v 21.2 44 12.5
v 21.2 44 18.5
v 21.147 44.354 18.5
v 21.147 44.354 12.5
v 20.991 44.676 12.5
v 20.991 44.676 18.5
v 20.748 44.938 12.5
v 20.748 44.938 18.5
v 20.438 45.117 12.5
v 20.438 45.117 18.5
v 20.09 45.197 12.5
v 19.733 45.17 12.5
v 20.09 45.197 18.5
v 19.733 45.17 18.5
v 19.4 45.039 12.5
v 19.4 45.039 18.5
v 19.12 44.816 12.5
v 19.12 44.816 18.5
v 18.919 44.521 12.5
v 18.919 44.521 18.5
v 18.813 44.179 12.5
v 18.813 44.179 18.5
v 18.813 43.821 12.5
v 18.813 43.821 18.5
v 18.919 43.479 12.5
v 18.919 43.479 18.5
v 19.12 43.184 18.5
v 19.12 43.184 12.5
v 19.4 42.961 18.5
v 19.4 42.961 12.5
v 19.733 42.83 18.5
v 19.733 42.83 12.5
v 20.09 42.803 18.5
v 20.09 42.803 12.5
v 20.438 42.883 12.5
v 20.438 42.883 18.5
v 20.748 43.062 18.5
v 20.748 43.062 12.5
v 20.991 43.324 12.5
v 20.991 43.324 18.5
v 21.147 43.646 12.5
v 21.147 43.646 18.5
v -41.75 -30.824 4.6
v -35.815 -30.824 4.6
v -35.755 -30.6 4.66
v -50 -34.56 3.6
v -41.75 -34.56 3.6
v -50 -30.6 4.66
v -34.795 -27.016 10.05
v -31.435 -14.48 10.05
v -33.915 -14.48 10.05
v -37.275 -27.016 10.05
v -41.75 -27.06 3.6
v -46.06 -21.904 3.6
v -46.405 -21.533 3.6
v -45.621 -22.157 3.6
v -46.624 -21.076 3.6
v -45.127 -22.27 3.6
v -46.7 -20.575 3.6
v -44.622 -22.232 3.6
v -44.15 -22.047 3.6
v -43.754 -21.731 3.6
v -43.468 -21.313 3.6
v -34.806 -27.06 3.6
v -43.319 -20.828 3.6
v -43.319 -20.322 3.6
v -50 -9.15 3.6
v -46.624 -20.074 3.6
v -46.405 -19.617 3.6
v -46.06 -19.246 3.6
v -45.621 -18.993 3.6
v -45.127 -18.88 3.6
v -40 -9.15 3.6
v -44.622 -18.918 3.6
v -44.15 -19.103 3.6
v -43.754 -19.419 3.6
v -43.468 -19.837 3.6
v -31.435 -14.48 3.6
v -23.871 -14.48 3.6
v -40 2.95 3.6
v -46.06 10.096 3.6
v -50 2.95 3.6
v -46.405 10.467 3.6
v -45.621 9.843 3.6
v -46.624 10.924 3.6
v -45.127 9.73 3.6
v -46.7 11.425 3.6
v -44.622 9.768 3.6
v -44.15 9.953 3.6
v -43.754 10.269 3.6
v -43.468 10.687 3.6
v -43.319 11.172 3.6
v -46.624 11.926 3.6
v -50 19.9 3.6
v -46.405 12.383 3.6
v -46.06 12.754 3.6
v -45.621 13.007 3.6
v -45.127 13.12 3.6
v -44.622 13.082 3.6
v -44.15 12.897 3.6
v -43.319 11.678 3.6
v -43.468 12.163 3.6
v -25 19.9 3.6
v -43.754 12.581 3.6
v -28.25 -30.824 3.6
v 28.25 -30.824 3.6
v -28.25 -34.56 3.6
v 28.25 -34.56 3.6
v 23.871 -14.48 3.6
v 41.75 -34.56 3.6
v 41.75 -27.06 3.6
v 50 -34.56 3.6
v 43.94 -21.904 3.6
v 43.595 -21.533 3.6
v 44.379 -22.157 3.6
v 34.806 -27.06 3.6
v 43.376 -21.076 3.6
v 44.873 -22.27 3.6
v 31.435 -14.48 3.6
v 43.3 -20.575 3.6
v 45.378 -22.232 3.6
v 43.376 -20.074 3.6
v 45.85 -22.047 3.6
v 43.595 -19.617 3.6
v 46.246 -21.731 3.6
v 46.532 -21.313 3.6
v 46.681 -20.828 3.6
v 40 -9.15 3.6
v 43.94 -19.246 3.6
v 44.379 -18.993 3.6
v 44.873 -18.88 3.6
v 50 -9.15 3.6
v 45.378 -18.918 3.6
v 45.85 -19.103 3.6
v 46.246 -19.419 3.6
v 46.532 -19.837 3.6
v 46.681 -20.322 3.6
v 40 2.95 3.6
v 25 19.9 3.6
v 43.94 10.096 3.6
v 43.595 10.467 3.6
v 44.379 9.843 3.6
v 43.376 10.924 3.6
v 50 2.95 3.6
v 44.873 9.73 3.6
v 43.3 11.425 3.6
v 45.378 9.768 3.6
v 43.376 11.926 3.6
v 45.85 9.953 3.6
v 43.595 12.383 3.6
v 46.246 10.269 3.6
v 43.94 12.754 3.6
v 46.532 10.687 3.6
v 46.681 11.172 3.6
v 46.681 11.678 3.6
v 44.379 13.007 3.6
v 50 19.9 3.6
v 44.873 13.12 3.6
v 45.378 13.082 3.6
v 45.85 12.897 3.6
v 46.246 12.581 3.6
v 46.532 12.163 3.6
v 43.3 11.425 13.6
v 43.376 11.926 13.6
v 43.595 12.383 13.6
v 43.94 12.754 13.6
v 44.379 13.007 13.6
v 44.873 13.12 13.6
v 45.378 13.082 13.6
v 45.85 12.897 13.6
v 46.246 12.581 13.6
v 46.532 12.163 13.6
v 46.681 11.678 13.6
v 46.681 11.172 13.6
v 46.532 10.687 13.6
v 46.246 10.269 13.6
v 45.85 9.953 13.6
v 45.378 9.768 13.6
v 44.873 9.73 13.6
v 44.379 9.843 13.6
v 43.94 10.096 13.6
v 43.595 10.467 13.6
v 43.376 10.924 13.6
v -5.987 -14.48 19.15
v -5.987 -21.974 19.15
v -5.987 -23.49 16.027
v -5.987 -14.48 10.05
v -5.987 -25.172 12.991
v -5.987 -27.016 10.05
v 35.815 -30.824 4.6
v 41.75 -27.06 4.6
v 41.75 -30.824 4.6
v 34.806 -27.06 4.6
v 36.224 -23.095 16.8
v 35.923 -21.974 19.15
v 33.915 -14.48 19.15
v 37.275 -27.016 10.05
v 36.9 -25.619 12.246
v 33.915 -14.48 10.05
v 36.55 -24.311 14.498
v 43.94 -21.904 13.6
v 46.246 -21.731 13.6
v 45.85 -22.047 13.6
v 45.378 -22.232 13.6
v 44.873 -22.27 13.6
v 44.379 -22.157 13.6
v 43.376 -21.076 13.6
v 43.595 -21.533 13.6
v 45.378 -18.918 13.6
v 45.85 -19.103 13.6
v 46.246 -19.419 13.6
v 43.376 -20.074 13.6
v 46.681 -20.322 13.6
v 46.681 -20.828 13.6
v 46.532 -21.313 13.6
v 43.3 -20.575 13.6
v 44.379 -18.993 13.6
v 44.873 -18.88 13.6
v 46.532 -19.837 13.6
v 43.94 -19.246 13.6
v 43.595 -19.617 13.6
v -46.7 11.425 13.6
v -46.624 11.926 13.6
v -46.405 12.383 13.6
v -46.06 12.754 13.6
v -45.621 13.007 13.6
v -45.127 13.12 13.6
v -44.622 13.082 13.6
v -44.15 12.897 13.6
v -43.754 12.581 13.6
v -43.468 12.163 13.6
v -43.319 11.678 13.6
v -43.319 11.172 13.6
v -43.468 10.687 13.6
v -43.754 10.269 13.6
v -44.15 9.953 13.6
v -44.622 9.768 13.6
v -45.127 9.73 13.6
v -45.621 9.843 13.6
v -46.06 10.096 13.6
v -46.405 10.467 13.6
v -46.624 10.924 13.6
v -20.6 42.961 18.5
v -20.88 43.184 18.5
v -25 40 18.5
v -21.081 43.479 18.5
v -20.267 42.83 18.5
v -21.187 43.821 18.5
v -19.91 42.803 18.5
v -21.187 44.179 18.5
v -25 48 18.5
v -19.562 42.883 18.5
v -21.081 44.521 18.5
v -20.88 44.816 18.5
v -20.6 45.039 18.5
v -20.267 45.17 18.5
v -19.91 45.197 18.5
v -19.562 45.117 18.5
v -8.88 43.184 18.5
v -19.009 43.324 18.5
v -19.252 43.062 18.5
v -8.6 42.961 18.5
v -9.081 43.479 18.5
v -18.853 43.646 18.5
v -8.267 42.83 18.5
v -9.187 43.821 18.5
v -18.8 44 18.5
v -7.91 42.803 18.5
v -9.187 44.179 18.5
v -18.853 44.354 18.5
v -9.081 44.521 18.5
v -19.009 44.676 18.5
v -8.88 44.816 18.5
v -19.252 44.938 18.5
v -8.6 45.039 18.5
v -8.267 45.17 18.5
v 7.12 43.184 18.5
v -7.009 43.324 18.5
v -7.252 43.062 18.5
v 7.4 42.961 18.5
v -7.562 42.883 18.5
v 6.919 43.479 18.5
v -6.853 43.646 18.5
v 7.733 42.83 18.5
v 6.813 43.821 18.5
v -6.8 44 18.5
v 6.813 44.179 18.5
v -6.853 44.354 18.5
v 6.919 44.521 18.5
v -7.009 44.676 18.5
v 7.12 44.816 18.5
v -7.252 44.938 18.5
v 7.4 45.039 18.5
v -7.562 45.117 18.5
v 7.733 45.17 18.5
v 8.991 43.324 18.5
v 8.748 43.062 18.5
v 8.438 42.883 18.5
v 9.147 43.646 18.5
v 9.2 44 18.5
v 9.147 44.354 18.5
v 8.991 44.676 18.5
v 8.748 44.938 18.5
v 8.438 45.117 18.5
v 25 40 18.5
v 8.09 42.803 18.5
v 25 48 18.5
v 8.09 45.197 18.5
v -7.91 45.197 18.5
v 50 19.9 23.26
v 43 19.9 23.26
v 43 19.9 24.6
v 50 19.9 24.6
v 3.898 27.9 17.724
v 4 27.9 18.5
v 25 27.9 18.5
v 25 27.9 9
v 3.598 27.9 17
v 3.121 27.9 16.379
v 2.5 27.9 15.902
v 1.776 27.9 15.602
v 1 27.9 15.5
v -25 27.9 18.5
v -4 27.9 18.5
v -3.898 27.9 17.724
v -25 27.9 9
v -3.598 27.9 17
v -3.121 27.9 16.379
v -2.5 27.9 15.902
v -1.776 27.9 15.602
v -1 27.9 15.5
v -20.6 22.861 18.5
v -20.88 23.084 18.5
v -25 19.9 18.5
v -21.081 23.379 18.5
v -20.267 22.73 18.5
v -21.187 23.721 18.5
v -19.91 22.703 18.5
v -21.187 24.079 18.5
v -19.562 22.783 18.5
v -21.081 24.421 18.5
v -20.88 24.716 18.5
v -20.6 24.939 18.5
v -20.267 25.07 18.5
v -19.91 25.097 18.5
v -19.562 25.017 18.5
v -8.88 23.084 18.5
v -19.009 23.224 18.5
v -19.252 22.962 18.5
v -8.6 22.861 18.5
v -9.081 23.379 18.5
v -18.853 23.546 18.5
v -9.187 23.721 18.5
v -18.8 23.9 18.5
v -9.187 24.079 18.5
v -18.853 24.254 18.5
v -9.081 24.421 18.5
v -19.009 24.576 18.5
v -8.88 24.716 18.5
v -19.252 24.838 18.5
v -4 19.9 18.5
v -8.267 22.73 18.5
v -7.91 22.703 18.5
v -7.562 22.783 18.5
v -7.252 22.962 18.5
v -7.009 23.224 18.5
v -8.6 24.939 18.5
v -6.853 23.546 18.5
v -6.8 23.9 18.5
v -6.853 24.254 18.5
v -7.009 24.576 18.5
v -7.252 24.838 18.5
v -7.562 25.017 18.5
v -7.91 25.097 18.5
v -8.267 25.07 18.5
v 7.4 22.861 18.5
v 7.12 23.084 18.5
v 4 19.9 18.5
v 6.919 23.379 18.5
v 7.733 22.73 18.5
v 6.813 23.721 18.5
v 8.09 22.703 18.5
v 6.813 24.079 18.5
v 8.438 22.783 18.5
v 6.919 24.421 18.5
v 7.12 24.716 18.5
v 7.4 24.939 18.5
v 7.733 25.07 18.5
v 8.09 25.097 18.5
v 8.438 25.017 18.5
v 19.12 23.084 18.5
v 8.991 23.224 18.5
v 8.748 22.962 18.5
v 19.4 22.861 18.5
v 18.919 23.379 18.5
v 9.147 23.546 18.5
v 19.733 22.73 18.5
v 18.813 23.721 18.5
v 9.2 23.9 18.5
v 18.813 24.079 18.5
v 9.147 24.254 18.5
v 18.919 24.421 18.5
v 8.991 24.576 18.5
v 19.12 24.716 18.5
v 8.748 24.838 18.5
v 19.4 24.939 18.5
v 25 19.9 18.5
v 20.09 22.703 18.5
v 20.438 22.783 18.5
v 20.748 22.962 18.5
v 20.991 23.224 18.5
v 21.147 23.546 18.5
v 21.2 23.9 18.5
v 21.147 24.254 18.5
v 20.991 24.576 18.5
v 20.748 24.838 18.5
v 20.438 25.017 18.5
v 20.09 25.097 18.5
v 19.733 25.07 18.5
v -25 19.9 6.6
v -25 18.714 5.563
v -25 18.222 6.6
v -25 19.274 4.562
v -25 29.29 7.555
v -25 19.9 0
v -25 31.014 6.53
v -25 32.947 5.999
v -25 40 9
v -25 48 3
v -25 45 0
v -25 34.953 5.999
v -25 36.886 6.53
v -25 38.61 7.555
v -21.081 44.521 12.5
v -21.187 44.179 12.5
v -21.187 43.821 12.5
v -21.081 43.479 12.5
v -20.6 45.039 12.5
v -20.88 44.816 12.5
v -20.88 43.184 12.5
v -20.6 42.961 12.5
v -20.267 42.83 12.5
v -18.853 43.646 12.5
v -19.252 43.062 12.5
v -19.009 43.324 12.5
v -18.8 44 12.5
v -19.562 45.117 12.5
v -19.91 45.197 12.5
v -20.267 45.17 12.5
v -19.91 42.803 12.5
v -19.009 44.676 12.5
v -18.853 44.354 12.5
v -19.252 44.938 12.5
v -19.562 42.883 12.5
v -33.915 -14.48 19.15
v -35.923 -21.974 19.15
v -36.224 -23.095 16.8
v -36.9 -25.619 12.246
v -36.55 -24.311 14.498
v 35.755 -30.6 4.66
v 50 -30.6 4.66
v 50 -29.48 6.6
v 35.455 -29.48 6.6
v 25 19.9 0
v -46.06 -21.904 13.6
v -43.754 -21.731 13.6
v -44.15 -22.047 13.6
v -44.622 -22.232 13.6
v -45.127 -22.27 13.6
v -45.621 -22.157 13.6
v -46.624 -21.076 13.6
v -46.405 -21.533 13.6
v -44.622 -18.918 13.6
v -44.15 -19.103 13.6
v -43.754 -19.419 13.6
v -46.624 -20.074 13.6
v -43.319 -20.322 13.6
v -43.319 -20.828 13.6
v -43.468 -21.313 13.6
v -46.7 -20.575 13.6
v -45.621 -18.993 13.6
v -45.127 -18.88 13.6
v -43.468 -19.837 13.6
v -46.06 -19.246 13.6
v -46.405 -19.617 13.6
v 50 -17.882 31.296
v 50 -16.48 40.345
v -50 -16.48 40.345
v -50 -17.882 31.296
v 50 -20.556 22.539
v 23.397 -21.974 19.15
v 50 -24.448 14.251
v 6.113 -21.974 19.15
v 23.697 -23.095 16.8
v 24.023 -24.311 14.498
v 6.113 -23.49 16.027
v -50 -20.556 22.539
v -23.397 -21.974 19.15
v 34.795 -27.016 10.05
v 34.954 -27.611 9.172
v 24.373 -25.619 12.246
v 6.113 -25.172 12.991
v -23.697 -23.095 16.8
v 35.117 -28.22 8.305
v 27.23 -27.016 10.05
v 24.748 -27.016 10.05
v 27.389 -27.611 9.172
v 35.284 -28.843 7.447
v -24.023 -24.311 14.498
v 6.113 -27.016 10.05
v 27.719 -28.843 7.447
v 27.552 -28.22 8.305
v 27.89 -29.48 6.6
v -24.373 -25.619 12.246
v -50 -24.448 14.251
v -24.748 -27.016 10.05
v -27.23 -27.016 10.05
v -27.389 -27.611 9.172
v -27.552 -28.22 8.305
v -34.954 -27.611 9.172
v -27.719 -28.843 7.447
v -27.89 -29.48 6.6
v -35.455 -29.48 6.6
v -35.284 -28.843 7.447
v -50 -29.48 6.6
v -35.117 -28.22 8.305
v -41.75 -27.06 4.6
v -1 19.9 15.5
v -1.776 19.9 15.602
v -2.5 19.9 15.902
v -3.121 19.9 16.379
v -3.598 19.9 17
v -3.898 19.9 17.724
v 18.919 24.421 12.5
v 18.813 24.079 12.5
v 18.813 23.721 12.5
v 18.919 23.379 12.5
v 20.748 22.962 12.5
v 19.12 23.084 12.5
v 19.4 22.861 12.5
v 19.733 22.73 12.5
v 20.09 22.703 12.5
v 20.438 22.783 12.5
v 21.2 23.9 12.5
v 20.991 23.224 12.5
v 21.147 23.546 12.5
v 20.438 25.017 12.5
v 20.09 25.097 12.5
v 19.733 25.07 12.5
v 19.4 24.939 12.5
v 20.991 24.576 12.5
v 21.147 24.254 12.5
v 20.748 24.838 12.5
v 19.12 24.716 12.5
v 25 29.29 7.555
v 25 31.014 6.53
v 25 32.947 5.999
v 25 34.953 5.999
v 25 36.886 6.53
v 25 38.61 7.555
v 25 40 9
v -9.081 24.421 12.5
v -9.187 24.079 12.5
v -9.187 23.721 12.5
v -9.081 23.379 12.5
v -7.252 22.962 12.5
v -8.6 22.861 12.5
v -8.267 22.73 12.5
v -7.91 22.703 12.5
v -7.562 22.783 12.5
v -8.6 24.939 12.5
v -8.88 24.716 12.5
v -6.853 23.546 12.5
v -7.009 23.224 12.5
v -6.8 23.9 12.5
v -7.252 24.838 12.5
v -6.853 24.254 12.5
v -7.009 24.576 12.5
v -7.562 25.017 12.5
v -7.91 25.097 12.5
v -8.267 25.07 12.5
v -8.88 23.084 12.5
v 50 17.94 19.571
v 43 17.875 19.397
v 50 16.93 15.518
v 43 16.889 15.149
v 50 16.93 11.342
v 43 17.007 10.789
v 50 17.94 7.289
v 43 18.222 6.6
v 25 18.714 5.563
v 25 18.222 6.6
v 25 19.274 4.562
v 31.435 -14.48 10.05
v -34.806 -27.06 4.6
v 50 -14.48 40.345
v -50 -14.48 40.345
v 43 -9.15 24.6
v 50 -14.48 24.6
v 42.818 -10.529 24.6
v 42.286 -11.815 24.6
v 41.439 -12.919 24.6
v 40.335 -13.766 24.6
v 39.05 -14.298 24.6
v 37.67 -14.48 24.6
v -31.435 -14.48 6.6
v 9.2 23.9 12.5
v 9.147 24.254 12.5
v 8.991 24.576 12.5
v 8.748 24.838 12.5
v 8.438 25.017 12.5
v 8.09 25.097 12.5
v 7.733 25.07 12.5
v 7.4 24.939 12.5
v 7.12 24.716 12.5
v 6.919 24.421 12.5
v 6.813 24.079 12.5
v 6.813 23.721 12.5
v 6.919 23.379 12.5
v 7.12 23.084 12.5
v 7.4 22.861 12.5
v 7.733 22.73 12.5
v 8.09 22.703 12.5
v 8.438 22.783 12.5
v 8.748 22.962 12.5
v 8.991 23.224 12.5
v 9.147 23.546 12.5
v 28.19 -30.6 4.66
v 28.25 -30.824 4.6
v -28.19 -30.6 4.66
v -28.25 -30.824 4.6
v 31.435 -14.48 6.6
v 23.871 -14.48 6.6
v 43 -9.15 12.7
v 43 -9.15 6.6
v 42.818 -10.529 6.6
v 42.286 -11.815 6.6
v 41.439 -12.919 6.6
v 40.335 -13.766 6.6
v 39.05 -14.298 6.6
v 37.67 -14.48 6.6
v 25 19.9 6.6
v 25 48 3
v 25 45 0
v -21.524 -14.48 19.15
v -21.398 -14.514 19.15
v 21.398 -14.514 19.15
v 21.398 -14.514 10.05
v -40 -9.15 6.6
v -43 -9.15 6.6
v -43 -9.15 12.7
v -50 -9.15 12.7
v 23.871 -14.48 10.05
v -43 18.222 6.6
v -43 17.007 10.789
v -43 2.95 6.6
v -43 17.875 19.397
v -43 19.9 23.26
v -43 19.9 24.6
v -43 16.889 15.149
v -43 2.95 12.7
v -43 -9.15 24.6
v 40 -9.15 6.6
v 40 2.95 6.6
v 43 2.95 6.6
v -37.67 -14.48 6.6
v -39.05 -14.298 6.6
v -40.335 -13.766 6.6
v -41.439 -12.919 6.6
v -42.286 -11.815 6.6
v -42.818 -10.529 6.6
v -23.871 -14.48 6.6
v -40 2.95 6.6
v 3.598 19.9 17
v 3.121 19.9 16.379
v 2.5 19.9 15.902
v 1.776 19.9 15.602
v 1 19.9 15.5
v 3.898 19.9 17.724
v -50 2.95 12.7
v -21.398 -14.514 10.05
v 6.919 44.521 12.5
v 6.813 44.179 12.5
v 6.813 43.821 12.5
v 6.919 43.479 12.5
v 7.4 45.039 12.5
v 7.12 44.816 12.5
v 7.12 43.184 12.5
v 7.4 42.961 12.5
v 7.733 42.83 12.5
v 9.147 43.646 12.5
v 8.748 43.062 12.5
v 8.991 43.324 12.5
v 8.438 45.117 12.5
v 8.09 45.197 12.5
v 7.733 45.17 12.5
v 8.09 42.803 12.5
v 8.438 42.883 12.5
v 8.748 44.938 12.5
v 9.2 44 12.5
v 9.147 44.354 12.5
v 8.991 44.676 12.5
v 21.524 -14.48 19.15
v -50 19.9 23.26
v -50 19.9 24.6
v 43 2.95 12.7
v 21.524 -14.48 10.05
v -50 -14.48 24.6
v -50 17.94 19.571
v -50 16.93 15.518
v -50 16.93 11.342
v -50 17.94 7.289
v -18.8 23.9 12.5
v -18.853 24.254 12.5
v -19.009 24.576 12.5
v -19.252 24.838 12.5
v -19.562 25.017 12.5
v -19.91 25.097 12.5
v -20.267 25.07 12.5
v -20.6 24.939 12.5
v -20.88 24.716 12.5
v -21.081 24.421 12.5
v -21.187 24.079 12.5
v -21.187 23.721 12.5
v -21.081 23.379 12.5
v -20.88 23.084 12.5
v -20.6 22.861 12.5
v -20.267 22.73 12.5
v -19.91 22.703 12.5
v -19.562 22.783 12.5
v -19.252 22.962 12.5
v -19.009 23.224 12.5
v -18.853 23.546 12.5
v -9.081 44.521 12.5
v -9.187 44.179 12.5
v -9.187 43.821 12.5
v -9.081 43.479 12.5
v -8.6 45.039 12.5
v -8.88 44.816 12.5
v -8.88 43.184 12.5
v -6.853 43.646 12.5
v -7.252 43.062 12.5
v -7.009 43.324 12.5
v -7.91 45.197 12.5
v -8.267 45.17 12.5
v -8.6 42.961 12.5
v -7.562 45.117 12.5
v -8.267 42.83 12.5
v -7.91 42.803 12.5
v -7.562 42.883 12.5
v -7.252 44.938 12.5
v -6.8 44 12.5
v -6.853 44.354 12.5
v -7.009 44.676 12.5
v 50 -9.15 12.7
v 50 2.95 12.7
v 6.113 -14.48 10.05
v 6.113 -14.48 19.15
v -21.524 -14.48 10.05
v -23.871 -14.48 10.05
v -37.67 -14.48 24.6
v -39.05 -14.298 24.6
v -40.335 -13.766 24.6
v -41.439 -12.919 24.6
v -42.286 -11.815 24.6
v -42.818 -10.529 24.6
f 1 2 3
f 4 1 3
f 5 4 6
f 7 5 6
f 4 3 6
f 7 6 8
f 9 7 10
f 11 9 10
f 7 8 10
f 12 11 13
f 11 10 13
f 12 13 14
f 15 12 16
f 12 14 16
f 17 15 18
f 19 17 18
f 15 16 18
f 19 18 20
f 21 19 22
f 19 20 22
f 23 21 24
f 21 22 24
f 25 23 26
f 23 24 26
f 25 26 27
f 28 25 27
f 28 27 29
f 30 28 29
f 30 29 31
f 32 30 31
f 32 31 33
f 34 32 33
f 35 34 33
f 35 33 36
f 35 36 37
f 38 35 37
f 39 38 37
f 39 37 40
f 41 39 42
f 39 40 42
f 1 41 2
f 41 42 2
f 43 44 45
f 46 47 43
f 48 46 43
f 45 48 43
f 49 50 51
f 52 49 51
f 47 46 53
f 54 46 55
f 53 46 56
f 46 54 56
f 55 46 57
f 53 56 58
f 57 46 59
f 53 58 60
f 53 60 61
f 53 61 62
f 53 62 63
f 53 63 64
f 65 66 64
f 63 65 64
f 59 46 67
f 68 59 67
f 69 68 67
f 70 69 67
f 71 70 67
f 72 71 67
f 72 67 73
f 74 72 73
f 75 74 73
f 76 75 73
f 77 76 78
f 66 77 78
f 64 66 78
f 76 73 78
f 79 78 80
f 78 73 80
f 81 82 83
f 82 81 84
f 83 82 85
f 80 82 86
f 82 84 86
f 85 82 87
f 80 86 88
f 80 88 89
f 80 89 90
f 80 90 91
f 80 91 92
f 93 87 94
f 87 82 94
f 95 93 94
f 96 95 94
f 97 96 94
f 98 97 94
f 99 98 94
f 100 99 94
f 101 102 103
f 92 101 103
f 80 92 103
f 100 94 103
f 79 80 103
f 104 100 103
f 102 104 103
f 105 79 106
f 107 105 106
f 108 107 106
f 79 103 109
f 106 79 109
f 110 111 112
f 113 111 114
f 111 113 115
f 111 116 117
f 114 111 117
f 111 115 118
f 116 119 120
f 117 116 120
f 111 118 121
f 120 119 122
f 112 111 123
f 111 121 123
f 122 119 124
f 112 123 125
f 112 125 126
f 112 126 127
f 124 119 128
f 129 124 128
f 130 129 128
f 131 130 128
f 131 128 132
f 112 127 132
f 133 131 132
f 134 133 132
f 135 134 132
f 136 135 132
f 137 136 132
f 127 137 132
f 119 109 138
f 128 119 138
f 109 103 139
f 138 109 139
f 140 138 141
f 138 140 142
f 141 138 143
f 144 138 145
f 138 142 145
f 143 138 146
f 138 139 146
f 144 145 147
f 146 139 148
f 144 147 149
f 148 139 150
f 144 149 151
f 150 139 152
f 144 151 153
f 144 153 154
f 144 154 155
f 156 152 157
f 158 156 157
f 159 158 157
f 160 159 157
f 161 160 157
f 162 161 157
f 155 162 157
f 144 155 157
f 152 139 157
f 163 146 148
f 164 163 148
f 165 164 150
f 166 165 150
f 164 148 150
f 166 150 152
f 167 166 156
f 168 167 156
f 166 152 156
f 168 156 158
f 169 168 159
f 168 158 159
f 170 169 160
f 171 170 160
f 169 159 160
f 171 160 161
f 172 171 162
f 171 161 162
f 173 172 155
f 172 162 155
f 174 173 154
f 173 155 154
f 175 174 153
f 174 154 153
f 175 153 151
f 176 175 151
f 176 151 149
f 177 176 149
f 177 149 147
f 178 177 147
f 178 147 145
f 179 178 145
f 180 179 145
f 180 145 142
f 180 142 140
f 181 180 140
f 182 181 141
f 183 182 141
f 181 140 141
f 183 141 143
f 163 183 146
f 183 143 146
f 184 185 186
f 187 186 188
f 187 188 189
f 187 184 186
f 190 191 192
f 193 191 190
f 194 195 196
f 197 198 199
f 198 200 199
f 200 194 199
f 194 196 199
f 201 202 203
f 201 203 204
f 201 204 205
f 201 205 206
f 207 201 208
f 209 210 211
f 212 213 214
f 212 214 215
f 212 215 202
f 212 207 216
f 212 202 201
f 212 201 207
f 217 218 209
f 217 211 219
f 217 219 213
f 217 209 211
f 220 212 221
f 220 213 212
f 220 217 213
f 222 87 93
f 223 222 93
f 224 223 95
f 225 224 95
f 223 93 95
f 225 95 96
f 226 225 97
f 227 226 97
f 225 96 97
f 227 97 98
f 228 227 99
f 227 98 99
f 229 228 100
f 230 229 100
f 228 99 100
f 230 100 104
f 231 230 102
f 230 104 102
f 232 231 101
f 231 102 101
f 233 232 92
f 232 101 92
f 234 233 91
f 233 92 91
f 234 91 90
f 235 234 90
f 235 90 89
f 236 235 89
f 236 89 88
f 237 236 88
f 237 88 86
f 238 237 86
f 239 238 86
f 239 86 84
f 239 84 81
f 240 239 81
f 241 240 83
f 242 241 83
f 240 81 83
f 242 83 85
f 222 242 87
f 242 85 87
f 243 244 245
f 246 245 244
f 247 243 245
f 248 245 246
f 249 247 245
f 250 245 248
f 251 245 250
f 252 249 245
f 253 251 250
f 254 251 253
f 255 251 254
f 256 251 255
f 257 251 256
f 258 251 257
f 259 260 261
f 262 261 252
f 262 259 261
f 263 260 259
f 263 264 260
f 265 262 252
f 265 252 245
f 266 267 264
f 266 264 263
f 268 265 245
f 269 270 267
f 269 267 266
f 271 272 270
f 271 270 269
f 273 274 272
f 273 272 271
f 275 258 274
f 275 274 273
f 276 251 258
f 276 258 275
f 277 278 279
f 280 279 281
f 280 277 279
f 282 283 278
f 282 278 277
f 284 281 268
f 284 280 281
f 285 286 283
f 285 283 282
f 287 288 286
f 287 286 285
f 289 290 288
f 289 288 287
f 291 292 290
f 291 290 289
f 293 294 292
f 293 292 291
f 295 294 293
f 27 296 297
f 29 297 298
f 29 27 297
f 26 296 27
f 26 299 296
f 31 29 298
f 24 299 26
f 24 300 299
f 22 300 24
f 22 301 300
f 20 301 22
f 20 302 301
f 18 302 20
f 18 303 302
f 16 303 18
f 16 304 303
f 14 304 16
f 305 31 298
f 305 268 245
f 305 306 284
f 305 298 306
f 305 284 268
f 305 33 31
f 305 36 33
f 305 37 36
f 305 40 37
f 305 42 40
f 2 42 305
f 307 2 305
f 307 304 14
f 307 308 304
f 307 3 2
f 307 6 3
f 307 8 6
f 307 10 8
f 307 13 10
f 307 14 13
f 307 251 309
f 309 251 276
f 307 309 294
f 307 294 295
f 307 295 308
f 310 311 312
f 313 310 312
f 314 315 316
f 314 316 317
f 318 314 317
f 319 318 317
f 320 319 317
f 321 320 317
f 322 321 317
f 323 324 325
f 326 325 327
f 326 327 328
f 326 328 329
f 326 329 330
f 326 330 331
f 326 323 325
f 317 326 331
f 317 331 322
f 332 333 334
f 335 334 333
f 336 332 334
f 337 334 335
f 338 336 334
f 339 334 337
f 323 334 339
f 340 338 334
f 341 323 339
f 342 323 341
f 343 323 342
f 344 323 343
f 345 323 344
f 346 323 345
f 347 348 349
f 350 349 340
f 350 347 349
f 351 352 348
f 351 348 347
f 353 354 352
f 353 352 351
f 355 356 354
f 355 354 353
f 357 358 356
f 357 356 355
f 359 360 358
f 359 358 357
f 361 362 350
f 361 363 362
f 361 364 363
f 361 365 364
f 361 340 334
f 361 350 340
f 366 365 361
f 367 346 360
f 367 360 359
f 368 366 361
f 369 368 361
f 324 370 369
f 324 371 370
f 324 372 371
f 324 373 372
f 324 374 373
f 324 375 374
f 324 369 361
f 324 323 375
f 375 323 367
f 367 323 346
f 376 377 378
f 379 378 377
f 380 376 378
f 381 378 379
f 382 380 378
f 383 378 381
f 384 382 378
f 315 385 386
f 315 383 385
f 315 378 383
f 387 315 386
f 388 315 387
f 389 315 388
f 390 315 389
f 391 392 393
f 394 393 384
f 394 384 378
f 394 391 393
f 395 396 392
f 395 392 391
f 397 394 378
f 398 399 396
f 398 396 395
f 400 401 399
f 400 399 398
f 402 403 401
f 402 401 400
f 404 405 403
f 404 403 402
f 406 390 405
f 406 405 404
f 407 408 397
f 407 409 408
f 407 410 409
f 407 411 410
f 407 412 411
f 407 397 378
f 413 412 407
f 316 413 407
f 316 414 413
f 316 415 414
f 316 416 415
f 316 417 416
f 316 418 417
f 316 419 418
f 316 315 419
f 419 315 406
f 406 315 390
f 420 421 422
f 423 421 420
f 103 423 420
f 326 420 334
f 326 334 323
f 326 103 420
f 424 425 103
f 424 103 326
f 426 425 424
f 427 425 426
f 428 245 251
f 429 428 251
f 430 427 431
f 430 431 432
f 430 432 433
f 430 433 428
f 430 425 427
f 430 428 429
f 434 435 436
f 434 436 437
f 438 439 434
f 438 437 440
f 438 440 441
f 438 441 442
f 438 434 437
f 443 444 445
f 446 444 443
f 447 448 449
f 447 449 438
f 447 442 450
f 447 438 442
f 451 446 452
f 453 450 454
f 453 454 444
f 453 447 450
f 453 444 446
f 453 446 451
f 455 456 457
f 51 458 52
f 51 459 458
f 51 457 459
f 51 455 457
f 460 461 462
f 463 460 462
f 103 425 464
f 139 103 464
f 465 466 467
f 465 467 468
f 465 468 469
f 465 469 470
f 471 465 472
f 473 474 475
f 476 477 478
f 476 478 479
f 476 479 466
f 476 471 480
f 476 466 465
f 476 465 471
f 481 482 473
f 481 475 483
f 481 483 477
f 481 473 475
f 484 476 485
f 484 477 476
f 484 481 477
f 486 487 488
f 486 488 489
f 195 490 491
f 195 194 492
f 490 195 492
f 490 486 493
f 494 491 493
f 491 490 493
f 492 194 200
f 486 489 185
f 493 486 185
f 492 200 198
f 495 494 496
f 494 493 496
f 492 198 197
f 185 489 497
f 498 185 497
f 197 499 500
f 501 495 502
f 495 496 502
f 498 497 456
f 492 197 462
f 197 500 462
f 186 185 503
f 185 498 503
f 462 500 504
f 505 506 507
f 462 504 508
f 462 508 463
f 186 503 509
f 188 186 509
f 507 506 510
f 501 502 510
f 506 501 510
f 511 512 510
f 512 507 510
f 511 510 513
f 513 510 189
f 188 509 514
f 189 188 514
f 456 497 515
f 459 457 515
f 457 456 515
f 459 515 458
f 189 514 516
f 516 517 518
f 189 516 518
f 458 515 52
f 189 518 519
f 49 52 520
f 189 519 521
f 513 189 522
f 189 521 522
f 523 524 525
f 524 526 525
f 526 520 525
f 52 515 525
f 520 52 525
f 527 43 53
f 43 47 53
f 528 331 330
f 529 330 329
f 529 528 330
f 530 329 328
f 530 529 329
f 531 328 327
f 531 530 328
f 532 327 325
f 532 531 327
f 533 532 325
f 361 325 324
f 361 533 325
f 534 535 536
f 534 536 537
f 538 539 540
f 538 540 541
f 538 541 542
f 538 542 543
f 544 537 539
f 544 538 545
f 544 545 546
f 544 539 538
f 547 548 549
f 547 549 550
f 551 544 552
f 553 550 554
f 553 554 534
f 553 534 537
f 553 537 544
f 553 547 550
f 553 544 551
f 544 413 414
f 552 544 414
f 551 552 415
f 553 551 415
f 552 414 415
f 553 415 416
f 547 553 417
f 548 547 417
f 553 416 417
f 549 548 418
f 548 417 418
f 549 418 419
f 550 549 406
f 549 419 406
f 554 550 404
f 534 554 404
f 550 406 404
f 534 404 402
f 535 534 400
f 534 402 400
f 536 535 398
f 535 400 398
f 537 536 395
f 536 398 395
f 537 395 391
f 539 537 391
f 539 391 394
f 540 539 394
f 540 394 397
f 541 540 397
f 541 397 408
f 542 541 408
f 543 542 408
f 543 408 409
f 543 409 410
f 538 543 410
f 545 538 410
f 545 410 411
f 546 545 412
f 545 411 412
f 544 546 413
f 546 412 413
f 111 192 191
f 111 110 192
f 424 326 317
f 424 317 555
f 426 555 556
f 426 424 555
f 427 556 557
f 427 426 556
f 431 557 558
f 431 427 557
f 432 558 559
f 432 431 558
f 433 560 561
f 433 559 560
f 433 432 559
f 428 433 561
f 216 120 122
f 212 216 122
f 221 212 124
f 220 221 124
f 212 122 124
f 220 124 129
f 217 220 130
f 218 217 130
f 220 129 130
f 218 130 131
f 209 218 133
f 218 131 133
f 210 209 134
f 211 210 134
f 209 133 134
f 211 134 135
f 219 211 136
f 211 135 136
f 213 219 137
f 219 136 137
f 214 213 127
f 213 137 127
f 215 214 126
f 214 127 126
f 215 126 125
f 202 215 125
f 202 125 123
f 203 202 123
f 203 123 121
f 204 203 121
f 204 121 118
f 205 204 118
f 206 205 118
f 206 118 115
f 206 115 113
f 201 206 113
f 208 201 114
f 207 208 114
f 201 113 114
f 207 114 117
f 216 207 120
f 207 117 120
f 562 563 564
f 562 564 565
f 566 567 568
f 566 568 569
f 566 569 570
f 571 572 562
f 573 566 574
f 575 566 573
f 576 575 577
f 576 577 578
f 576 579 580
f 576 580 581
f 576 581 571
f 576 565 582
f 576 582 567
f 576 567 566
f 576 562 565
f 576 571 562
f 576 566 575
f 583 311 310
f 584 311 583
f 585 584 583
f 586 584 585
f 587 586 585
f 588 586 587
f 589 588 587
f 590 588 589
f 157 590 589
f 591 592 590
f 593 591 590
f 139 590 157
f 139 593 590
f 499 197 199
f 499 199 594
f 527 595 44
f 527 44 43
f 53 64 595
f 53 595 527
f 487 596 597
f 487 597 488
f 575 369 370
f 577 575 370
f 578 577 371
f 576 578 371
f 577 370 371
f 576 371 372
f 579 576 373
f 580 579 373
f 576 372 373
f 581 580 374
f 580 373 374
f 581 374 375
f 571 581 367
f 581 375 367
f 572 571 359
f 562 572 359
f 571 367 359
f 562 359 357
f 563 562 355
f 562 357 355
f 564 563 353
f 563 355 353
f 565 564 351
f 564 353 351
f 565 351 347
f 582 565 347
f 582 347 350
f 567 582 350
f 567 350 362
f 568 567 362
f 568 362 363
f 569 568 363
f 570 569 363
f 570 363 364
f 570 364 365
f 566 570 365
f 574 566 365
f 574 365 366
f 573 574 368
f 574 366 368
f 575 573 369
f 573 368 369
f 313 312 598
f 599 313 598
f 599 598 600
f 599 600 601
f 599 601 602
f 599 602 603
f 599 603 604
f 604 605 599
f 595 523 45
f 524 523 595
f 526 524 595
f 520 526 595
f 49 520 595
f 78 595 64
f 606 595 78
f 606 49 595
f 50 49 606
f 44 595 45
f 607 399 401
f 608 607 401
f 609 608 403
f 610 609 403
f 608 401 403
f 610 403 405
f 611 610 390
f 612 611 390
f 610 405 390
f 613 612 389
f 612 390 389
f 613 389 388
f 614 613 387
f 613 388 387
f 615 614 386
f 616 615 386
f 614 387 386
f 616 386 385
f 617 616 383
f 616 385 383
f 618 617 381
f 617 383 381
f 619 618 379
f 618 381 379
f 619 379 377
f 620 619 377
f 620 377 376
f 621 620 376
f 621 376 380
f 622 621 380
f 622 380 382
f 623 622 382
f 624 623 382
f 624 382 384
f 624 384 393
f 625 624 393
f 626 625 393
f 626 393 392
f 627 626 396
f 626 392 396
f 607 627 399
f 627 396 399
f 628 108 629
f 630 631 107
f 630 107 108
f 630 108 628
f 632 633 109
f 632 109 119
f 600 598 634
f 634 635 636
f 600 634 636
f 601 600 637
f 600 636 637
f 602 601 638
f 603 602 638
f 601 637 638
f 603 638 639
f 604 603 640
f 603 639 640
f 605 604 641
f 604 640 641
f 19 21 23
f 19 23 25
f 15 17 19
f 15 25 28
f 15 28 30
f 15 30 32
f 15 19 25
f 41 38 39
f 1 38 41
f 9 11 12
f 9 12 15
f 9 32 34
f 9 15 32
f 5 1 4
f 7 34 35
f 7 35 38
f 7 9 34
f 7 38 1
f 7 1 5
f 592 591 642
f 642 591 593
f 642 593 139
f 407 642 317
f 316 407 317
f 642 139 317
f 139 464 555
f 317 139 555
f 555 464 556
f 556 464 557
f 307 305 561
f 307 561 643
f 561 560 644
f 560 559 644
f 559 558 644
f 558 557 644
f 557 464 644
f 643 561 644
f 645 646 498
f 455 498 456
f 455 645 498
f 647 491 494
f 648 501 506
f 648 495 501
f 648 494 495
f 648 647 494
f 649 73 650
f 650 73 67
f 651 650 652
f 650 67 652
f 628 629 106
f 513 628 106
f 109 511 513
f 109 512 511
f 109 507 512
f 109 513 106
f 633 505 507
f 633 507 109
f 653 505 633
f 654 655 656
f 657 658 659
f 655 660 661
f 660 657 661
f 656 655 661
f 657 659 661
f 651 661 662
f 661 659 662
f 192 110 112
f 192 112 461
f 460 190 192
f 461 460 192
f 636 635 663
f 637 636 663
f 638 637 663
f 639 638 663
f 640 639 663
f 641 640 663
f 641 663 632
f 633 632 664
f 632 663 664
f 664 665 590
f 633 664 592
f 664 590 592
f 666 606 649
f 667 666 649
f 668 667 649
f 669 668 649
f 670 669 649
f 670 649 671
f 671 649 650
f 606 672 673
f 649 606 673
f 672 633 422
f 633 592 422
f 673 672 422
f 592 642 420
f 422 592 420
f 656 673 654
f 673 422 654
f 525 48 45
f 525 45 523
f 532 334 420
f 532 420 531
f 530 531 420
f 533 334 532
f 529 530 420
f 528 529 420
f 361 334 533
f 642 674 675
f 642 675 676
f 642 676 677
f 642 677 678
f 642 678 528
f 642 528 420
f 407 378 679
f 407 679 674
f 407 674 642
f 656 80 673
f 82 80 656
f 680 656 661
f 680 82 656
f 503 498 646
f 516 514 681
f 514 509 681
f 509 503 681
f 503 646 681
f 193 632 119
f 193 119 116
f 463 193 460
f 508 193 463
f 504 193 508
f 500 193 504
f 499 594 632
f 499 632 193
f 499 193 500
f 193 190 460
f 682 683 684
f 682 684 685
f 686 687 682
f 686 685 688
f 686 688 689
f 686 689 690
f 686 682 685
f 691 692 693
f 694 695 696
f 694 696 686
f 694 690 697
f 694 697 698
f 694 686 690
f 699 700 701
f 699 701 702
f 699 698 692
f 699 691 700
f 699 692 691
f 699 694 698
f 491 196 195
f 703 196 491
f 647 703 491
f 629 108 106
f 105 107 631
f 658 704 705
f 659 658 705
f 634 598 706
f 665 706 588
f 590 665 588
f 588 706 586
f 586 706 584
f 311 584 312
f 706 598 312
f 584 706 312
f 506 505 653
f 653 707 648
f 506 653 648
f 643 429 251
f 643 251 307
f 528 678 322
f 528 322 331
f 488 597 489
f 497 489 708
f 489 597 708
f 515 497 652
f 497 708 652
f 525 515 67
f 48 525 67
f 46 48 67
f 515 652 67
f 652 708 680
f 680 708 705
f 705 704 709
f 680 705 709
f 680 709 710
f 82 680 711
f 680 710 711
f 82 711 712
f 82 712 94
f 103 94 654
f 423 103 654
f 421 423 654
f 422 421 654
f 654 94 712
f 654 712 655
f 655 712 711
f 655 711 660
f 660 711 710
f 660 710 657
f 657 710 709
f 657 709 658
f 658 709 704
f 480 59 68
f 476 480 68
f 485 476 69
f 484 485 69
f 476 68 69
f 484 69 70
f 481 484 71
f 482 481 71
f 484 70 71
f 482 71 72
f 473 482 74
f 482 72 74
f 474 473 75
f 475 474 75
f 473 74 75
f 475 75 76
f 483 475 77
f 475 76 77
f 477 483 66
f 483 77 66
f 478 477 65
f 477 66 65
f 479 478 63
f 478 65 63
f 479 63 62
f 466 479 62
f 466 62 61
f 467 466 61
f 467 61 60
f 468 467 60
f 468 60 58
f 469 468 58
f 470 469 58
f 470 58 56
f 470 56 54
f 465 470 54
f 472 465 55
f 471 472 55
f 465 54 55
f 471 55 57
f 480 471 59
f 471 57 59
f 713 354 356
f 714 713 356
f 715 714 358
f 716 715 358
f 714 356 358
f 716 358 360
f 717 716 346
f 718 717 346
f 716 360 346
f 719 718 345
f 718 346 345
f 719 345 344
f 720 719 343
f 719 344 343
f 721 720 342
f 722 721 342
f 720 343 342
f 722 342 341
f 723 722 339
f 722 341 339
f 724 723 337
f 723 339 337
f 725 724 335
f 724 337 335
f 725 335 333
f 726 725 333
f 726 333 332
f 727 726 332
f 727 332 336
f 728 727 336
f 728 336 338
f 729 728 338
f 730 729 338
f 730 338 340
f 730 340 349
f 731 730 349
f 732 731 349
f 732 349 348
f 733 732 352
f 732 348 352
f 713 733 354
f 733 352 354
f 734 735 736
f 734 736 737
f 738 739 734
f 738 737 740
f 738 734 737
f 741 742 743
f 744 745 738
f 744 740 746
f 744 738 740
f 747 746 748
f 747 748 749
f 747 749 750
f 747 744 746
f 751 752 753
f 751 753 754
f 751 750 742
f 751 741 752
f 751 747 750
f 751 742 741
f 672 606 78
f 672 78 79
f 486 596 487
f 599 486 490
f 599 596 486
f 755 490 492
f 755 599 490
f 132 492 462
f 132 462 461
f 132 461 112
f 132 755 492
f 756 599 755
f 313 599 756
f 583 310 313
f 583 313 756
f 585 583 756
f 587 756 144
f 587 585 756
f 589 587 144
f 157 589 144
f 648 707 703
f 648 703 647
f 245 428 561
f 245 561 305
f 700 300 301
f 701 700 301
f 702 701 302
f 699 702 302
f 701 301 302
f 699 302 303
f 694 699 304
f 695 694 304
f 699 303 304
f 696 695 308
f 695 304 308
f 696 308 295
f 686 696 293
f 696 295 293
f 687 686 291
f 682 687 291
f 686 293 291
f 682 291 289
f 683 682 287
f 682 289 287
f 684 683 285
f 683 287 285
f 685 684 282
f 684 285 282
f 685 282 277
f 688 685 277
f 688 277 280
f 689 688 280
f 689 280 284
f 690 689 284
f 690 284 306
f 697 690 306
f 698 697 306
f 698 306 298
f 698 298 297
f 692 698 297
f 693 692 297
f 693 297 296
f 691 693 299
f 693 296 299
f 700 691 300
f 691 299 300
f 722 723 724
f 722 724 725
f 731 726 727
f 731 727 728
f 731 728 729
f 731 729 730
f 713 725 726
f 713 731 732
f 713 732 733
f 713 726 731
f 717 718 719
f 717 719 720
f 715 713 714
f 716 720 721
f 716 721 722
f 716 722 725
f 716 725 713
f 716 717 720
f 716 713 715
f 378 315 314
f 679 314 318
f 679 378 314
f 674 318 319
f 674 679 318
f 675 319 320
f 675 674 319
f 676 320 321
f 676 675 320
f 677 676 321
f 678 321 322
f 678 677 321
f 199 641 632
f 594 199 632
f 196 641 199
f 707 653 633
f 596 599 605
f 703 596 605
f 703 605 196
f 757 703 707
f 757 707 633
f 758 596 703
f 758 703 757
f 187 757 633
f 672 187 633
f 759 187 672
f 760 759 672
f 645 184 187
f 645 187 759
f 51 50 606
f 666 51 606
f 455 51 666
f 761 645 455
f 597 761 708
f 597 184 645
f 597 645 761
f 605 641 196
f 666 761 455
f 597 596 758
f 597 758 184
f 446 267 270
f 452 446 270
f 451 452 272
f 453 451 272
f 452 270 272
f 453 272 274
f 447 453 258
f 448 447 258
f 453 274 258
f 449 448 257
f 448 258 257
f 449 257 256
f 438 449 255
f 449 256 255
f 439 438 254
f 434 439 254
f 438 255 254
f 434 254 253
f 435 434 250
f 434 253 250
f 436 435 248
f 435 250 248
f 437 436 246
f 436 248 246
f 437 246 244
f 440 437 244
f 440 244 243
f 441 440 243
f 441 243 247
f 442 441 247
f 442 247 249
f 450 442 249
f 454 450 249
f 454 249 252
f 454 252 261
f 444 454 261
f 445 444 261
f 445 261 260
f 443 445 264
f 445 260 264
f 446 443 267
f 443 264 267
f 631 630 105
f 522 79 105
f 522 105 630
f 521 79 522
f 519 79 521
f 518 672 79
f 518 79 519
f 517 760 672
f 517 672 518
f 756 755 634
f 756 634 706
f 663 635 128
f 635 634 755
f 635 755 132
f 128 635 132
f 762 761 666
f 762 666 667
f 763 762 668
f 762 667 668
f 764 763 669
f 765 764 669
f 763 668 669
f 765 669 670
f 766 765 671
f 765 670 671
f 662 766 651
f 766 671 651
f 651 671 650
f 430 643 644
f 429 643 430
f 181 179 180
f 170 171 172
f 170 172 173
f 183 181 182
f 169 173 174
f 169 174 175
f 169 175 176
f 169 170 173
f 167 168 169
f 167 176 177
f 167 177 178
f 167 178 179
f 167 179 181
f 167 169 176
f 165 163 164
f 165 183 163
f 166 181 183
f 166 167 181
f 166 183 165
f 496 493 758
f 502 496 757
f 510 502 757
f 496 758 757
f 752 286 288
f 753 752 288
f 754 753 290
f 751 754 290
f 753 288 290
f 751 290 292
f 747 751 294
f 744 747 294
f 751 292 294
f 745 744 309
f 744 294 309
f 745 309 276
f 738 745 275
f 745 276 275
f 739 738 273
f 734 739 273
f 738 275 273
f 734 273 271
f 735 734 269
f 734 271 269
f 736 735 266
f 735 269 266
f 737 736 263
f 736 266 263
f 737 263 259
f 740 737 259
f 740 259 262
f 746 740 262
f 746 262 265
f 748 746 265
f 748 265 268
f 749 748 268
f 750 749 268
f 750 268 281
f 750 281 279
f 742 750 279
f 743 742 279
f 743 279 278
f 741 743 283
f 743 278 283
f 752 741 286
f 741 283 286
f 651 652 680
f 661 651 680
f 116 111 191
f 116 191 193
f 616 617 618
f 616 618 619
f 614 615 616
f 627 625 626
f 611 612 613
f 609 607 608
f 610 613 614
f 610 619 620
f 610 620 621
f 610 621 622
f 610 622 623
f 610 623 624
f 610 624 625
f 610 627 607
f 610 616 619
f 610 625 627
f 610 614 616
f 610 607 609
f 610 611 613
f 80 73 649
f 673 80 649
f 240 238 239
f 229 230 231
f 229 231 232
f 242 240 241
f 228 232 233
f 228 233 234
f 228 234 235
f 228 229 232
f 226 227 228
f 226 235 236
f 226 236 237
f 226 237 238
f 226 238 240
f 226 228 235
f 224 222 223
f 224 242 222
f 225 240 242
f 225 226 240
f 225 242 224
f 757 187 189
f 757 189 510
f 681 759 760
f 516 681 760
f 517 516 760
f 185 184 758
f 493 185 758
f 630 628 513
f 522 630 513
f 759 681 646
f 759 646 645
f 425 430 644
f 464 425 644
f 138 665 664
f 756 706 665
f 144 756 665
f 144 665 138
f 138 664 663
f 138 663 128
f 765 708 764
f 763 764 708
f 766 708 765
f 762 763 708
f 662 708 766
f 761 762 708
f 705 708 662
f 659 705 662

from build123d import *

# Parameters (mm, degrees)
BASE_DEPTH                  = 3
CROQUIS2_W                  = 50
CROQUIS2_H                  = 28.1
SALIENTE_EXTRUIR2_DEPTH     = 15.5
CORTAR_EXTRUIR1_REACH       = 92.946
CORTAR_EXTRUIR2_REACH       = 88.329
CROQUIS15_W                 = 100
CROQUIS15_H                 = 54.46
SALIENTE_EXTRUIR3_DEPTH     = 3.6
CORTAR_EXTRUIR3_DEPTH       = 3.6
CROQUIS5_R                  = 1.2
CORTAR_EXTRUIR4_DEPTH       = 6
CORTAR_EXTRUIR7_DEPTH       = 113.455546773
SALIENTE_EXTRUIR5_DEPTH     = 100
CHAFL_N1_SIZE               = 3
CORTAR_EXTRUIR9_DEPTH       = 25
CORTAR_EXTRUIR10_START      = -25
CORTAR_EXTRUIR10_DEPTH      = 25
CORTAR_EXTRUIR11_DEPTH      = 18
CORTAR_EXTRUIR14_DEPTH      = 10
CORTAR_EXTRUIR14_DEPTH_BACK = 10
CROQUIS45_W                 = 12.1
CROQUIS45_H                 = 9.1
CORTAR_EXTRUIR15_DEPTH      = 10
CORTAR_EXTRUIR15_DEPTH_BACK = 10
CROQUIS49_W                 = 12.1
CROQUIS49_H                 = 9.1
CROQUIS63_W                 = 12.1
CROQUIS63_H                 = 9.1
CORTAR_EXTRUIR19_DEPTH      = 30
CROQUIS64_W                 = 9.1
CROQUIS64_H                 = 12.1
CORTAR_EXTRUIR20_DEPTH      = 10
CROQUIS66_W                 = 9.1
CROQUIS66_H                 = 12.1
CORTAR_EXTRUIR21_DEPTH      = 10
SALIENTE_EXTRUIR11_DEPTH    = 18
CROQUIS73_R                 = 1.7
CORTAR_EXTRUIR22_DEPTH      = 10
CROQUIS75_W                 = 13.5
CROQUIS75_H                 = 7.5
CORTAR_EXTRUIR26_DEPTH      = 1
CORTAR_EXTRUIR27_DEPTH      = 76.642628391


with BuildPart() as part:
    # Croquis1 → Base (new body)
    with BuildSketch(Plane.XY):
        Polygon((-50, -48), (50, -48), (50, 19.9), (25, 19.9), (25, 48), (-25, 48), (-25, 19.9), (-50, 19.9), align=None)
    extrude(amount=BASE_DEPTH)

    # Croquis2 → Saliente-Extruir2 (add)
    with BuildSketch(Plane.XY.offset(3)):
        with Locations((0, 33.95)):
            Rectangle(CROQUIS2_W, CROQUIS2_H)
    extrude(amount=SALIENTE_EXTRUIR2_DEPTH)

    # Croquis3 → Cortar-Extruir1 (cut, up to next)
    with BuildSketch(Plane.ZY.offset(25), mode=Mode.PRIVATE) as cortar_extruir1_sk1:
        with BuildLine():
            Line((18.5, 40), (18.5, 27.9))
            Line((18.5, 27.9), (9, 27.9))
            ThreePointArc((9, 27.9), (5.931506818, 33.95), (9, 40))
            Line((9, 40), (18.5, 40))
        make_face()
    cortar_extruir1_tool1 = extrude(cortar_extruir1_sk1.sketch, amount=-CORTAR_EXTRUIR1_REACH, mode=Mode.PRIVATE) & part.part
    add(cortar_extruir1_tool1.solids().sort_by_distance((-25, 33.95, 12.643483))[0], mode=Mode.SUBTRACT)

    # Croquis4 → Cortar-Extruir2 (cut, up to next)
    with BuildSketch(Plane.XZ.offset(-19.9), mode=Mode.PRIVATE) as cortar_extruir2_sk1:
        with BuildLine():
            Line((1, 15.5), (-1, 15.5))
            ThreePointArc((-1, 15.5), (-3.121320344, 16.378679656), (-4, 18.5))
            Line((-4, 18.5), (4, 18.5))
            ThreePointArc((4, 18.5), (3.121320344, 16.378679656), (1, 15.5))
        make_face()
    cortar_extruir2_tool1 = extrude(cortar_extruir2_sk1.sketch, amount=-CORTAR_EXTRUIR2_REACH, mode=Mode.PRIVATE) & part.part
    add(cortar_extruir2_tool1.solids().sort_by_distance((0, 19.9, 17.159196))[0], mode=Mode.SUBTRACT)

    # Croquis15 → Saliente-Extruir3 (add)
    with BuildSketch(Plane.XY.offset(3)):
        with Locations((0, -7.33)):
            Rectangle(CROQUIS15_W, CROQUIS15_H)
    extrude(amount=SALIENTE_EXTRUIR3_DEPTH)

    # Croquis16 → Cortar-Extruir3 (cut)
    with BuildSketch(Plane(origin=(0, 0, 0), x_dir=(-1, 0, 0), z_dir=(0, 0, -1))):
        Polygon((25, 19.9), (50, 19.9), (50, -48), (-50, -48), (-50, 19.9), (-25, 19.9), align=None)
    extrude(amount=-CORTAR_EXTRUIR3_DEPTH, mode=Mode.SUBTRACT)

    # Croquis5 → Cortar-Extruir4 (cut)
    with BuildSketch(Plane.XY.offset(18.5)):
        with Locations((-20, 44)):
            Circle(CROQUIS5_R)
        with Locations((-8, 44)):
            Circle(CROQUIS5_R)
        with Locations((-20, 23.9)):
            Circle(CROQUIS5_R)
        with Locations((-8, 23.9)):
            Circle(CROQUIS5_R)
        with Locations((8, 44)):
            Circle(CROQUIS5_R)
        with Locations((20, 44)):
            Circle(CROQUIS5_R)
        with Locations((8, 23.9)):
            Circle(CROQUIS5_R)
        with Locations((20, 23.9)):
            Circle(CROQUIS5_R)
    extrude(amount=-CORTAR_EXTRUIR4_DEPTH, mode=Mode.SUBTRACT)

    # Croquis22 → Cortar-Extruir7 (cut, through all)
    with BuildSketch(Plane.ZY.offset(50)):
        Polygon((4.66, -30.6), (6.6, -29.479940478), (6.6, -34.56), (3.6, -34.56), align=None)
    extrude(amount=-CORTAR_EXTRUIR7_DEPTH, mode=Mode.SUBTRACT)

    # Croquis24 → Saliente-Extruir5 (add, through all)
    with BuildSketch(Plane.ZY.offset(50)):
        with BuildLine():
            Line((24.6, -14.479940478), (40.345333467, -14.479940478))
            Line((40.345333467, -14.479940478), (40.345333467, -16.479940478))
            ThreePointArc((40.345333467, -16.479940478), (22.538840373, -20.555918791), (6.6, -29.479940478))
            Line((6.6, -29.479940478), (6.6, 19.9))
            Line((6.6, 19.9), (24.6, 19.9))
            Line((24.6, 19.9), (24.6, -14.479940478))
        make_face()
    extrude(amount=-SALIENTE_EXTRUIR5_DEPTH)

    # Chaflán1
    chafl_n1_edges = [part.edges().sort_by_distance(p)[0] for p in [
        (0, 48, 0),
    ]]
    chamfer(chafl_n1_edges, length=CHAFL_N1_SIZE)

    # Croquis25 → Cortar-Extruir9 (cut)
    with BuildSketch(Plane.ZY.offset(50)):
        with BuildLine():
            Line((23.26, 19.9), (3.6, 19.9))
            ThreePointArc((3.6, 19.9), (13.43, 16.802656182), (23.26, 19.9))
        make_face()
    extrude(amount=-CORTAR_EXTRUIR9_DEPTH, mode=Mode.SUBTRACT)

    # Croquis26 → Cortar-Extruir10 (cut)
    with BuildSketch(Plane(origin=(50, 0, 0), x_dir=(0, 0, -1), z_dir=(1, 0, 0)).offset(CORTAR_EXTRUIR10_START)):
        with BuildLine():
            Line((-3.6, 19.9), (-23.26, 19.9))
            ThreePointArc((-23.26, 19.9), (-13.43, 16.802656182), (-3.6, 19.9))
        make_face()
    extrude(amount=CORTAR_EXTRUIR10_DEPTH, mode=Mode.SUBTRACT)

    # Croquis28 → Cortar-Extruir11 (cut)
    with BuildSketch(Plane.XY.offset(24.6)):
        Polygon((-43, -9.479940478), (-43, 19.9), (43, 19.9), (43, -9.479940478), (43, -14.479940478), (-43, -14.479940478), align=None)
    extrude(amount=-CORTAR_EXTRUIR11_DEPTH, mode=Mode.SUBTRACT)

    # Croquis45 → Cortar-Extruir14 (cut, two sides: drawn at the far end of the back side and taken through both)
    with BuildSketch(Plane(origin=(-7.65, -28.550188678, 0), x_dir=(-0.9659258262890681, 0.25881904510252135, 0), z_dir=(-0.25881904510252135, -0.9659258262890681, 0)).offset(-CORTAR_EXTRUIR14_DEPTH_BACK)):
        with Locations((22.96204173, -14.6)):
            Rectangle(CROQUIS45_W, CROQUIS45_H)
    extrude(amount=CORTAR_EXTRUIR14_DEPTH + CORTAR_EXTRUIR14_DEPTH_BACK, mode=Mode.SUBTRACT)

    # Croquis49 → Cortar-Extruir15 (cut, two sides: drawn at the far end of the back side and taken through both)
    with BuildSketch(Plane(origin=(7.65, -28.550188678, 0), x_dir=(-0.96592582628907, -0.2588190451025146, 0), z_dir=(0.2588190451025145, -0.9659258262890699, 0)).offset(-CORTAR_EXTRUIR15_DEPTH_BACK)):
        with Locations((-22.96204173, -14.6)):
            Rectangle(CROQUIS49_W, CROQUIS49_H)
    extrude(amount=CORTAR_EXTRUIR15_DEPTH + CORTAR_EXTRUIR15_DEPTH_BACK, mode=Mode.SUBTRACT)

    # Croquis63 → Cortar-Extruir19 (cut)
    with BuildSketch(Plane(origin=(0, -14.479940478, 0), x_dir=(1, 0, 0), z_dir=(0, 1, 0))):
        with Locations((0.063130338, -14.6)):
            Rectangle(CROQUIS63_W, CROQUIS63_H)
    extrude(amount=-CORTAR_EXTRUIR19_DEPTH, mode=Mode.SUBTRACT)

    # Croquis64 → Cortar-Extruir20 (cut)
    with BuildSketch(Plane.ZY.offset(50)):
        with Locations((8.15, -3.1)):
            Rectangle(CROQUIS64_W, CROQUIS64_H)
    extrude(amount=-CORTAR_EXTRUIR20_DEPTH, mode=Mode.SUBTRACT)

    # Croquis66 → Cortar-Extruir21 (cut)
    with BuildSketch(Plane(origin=(50, 0, 0), x_dir=(0, 0, -1), z_dir=(1, 0, 0))):
        with Locations((-8.15, -3.1)):
            Rectangle(CROQUIS66_W, CROQUIS66_H)
    extrude(amount=-CORTAR_EXTRUIR21_DEPTH, mode=Mode.SUBTRACT)

    # Croquis70 → Saliente-Extruir11 (add)
    with BuildSketch(Plane.XY.offset(6.6)):
        with BuildLine():
            Line((-43, -9.15), (-43, -14.479940478))
            Line((-43, -14.479940478), (-37.670059522, -14.479940478))
            ThreePointArc((-37.670059522, -14.479940478), (-41.438896577, -12.918837055), (-43, -9.15))
        make_face()
        with BuildLine():
            Line((43, -14.479940478), (43, -9.15))
            ThreePointArc((43, -9.15), (41.438896577, -12.918837055), (37.670059522, -14.479940478))
            Line((37.670059522, -14.479940478), (43, -14.479940478))
        make_face()
    extrude(amount=SALIENTE_EXTRUIR11_DEPTH)

    # Croquis73 → Cortar-Extruir22 (cut)
    with BuildSketch(Plane(origin=(0, 0, 3.6), x_dir=(-1, 0, 0), z_dir=(0, 0, -1))):
        with Locations((-45, 11.425)):
            Circle(CROQUIS73_R)
        with Locations((45, 11.425)):
            Circle(CROQUIS73_R)
        with Locations((45, -20.575)):
            Circle(CROQUIS73_R)
        with Locations((-45, -20.575)):
            Circle(CROQUIS73_R)
    extrude(amount=-CORTAR_EXTRUIR22_DEPTH, mode=Mode.SUBTRACT)

    # Croquis75 → Cortar-Extruir26 (cut)
    with BuildSketch(Plane(origin=(0, 0, 3.6), x_dir=(-1, 0, 0), z_dir=(0, 0, -1))):
        with Locations((-35, -30.81)):
            Rectangle(CROQUIS75_W, CROQUIS75_H)
        with Locations((35, -30.81)):
            Rectangle(CROQUIS75_W, CROQUIS75_H)
    extrude(amount=-CORTAR_EXTRUIR26_DEPTH, mode=Mode.SUBTRACT)

    # Croquis76 → Cortar-Extruir27 (cut, through all)
    with BuildSketch(Plane.XY.offset(10.05)):
        Polygon((-29.251017738, -34.56), (-36.815799839, -34.56), (-31.435364106, -14.479940478), (-23.870582005, -14.479940478), align=None)
        Polygon((29.251017738, -34.56), (23.870582005, -14.479940478), (31.435364106, -14.479940478), (36.815799839, -34.56), align=None)
    extrude(amount=-CORTAR_EXTRUIR27_DEPTH, mode=Mode.SUBTRACT)


solid = part.part
